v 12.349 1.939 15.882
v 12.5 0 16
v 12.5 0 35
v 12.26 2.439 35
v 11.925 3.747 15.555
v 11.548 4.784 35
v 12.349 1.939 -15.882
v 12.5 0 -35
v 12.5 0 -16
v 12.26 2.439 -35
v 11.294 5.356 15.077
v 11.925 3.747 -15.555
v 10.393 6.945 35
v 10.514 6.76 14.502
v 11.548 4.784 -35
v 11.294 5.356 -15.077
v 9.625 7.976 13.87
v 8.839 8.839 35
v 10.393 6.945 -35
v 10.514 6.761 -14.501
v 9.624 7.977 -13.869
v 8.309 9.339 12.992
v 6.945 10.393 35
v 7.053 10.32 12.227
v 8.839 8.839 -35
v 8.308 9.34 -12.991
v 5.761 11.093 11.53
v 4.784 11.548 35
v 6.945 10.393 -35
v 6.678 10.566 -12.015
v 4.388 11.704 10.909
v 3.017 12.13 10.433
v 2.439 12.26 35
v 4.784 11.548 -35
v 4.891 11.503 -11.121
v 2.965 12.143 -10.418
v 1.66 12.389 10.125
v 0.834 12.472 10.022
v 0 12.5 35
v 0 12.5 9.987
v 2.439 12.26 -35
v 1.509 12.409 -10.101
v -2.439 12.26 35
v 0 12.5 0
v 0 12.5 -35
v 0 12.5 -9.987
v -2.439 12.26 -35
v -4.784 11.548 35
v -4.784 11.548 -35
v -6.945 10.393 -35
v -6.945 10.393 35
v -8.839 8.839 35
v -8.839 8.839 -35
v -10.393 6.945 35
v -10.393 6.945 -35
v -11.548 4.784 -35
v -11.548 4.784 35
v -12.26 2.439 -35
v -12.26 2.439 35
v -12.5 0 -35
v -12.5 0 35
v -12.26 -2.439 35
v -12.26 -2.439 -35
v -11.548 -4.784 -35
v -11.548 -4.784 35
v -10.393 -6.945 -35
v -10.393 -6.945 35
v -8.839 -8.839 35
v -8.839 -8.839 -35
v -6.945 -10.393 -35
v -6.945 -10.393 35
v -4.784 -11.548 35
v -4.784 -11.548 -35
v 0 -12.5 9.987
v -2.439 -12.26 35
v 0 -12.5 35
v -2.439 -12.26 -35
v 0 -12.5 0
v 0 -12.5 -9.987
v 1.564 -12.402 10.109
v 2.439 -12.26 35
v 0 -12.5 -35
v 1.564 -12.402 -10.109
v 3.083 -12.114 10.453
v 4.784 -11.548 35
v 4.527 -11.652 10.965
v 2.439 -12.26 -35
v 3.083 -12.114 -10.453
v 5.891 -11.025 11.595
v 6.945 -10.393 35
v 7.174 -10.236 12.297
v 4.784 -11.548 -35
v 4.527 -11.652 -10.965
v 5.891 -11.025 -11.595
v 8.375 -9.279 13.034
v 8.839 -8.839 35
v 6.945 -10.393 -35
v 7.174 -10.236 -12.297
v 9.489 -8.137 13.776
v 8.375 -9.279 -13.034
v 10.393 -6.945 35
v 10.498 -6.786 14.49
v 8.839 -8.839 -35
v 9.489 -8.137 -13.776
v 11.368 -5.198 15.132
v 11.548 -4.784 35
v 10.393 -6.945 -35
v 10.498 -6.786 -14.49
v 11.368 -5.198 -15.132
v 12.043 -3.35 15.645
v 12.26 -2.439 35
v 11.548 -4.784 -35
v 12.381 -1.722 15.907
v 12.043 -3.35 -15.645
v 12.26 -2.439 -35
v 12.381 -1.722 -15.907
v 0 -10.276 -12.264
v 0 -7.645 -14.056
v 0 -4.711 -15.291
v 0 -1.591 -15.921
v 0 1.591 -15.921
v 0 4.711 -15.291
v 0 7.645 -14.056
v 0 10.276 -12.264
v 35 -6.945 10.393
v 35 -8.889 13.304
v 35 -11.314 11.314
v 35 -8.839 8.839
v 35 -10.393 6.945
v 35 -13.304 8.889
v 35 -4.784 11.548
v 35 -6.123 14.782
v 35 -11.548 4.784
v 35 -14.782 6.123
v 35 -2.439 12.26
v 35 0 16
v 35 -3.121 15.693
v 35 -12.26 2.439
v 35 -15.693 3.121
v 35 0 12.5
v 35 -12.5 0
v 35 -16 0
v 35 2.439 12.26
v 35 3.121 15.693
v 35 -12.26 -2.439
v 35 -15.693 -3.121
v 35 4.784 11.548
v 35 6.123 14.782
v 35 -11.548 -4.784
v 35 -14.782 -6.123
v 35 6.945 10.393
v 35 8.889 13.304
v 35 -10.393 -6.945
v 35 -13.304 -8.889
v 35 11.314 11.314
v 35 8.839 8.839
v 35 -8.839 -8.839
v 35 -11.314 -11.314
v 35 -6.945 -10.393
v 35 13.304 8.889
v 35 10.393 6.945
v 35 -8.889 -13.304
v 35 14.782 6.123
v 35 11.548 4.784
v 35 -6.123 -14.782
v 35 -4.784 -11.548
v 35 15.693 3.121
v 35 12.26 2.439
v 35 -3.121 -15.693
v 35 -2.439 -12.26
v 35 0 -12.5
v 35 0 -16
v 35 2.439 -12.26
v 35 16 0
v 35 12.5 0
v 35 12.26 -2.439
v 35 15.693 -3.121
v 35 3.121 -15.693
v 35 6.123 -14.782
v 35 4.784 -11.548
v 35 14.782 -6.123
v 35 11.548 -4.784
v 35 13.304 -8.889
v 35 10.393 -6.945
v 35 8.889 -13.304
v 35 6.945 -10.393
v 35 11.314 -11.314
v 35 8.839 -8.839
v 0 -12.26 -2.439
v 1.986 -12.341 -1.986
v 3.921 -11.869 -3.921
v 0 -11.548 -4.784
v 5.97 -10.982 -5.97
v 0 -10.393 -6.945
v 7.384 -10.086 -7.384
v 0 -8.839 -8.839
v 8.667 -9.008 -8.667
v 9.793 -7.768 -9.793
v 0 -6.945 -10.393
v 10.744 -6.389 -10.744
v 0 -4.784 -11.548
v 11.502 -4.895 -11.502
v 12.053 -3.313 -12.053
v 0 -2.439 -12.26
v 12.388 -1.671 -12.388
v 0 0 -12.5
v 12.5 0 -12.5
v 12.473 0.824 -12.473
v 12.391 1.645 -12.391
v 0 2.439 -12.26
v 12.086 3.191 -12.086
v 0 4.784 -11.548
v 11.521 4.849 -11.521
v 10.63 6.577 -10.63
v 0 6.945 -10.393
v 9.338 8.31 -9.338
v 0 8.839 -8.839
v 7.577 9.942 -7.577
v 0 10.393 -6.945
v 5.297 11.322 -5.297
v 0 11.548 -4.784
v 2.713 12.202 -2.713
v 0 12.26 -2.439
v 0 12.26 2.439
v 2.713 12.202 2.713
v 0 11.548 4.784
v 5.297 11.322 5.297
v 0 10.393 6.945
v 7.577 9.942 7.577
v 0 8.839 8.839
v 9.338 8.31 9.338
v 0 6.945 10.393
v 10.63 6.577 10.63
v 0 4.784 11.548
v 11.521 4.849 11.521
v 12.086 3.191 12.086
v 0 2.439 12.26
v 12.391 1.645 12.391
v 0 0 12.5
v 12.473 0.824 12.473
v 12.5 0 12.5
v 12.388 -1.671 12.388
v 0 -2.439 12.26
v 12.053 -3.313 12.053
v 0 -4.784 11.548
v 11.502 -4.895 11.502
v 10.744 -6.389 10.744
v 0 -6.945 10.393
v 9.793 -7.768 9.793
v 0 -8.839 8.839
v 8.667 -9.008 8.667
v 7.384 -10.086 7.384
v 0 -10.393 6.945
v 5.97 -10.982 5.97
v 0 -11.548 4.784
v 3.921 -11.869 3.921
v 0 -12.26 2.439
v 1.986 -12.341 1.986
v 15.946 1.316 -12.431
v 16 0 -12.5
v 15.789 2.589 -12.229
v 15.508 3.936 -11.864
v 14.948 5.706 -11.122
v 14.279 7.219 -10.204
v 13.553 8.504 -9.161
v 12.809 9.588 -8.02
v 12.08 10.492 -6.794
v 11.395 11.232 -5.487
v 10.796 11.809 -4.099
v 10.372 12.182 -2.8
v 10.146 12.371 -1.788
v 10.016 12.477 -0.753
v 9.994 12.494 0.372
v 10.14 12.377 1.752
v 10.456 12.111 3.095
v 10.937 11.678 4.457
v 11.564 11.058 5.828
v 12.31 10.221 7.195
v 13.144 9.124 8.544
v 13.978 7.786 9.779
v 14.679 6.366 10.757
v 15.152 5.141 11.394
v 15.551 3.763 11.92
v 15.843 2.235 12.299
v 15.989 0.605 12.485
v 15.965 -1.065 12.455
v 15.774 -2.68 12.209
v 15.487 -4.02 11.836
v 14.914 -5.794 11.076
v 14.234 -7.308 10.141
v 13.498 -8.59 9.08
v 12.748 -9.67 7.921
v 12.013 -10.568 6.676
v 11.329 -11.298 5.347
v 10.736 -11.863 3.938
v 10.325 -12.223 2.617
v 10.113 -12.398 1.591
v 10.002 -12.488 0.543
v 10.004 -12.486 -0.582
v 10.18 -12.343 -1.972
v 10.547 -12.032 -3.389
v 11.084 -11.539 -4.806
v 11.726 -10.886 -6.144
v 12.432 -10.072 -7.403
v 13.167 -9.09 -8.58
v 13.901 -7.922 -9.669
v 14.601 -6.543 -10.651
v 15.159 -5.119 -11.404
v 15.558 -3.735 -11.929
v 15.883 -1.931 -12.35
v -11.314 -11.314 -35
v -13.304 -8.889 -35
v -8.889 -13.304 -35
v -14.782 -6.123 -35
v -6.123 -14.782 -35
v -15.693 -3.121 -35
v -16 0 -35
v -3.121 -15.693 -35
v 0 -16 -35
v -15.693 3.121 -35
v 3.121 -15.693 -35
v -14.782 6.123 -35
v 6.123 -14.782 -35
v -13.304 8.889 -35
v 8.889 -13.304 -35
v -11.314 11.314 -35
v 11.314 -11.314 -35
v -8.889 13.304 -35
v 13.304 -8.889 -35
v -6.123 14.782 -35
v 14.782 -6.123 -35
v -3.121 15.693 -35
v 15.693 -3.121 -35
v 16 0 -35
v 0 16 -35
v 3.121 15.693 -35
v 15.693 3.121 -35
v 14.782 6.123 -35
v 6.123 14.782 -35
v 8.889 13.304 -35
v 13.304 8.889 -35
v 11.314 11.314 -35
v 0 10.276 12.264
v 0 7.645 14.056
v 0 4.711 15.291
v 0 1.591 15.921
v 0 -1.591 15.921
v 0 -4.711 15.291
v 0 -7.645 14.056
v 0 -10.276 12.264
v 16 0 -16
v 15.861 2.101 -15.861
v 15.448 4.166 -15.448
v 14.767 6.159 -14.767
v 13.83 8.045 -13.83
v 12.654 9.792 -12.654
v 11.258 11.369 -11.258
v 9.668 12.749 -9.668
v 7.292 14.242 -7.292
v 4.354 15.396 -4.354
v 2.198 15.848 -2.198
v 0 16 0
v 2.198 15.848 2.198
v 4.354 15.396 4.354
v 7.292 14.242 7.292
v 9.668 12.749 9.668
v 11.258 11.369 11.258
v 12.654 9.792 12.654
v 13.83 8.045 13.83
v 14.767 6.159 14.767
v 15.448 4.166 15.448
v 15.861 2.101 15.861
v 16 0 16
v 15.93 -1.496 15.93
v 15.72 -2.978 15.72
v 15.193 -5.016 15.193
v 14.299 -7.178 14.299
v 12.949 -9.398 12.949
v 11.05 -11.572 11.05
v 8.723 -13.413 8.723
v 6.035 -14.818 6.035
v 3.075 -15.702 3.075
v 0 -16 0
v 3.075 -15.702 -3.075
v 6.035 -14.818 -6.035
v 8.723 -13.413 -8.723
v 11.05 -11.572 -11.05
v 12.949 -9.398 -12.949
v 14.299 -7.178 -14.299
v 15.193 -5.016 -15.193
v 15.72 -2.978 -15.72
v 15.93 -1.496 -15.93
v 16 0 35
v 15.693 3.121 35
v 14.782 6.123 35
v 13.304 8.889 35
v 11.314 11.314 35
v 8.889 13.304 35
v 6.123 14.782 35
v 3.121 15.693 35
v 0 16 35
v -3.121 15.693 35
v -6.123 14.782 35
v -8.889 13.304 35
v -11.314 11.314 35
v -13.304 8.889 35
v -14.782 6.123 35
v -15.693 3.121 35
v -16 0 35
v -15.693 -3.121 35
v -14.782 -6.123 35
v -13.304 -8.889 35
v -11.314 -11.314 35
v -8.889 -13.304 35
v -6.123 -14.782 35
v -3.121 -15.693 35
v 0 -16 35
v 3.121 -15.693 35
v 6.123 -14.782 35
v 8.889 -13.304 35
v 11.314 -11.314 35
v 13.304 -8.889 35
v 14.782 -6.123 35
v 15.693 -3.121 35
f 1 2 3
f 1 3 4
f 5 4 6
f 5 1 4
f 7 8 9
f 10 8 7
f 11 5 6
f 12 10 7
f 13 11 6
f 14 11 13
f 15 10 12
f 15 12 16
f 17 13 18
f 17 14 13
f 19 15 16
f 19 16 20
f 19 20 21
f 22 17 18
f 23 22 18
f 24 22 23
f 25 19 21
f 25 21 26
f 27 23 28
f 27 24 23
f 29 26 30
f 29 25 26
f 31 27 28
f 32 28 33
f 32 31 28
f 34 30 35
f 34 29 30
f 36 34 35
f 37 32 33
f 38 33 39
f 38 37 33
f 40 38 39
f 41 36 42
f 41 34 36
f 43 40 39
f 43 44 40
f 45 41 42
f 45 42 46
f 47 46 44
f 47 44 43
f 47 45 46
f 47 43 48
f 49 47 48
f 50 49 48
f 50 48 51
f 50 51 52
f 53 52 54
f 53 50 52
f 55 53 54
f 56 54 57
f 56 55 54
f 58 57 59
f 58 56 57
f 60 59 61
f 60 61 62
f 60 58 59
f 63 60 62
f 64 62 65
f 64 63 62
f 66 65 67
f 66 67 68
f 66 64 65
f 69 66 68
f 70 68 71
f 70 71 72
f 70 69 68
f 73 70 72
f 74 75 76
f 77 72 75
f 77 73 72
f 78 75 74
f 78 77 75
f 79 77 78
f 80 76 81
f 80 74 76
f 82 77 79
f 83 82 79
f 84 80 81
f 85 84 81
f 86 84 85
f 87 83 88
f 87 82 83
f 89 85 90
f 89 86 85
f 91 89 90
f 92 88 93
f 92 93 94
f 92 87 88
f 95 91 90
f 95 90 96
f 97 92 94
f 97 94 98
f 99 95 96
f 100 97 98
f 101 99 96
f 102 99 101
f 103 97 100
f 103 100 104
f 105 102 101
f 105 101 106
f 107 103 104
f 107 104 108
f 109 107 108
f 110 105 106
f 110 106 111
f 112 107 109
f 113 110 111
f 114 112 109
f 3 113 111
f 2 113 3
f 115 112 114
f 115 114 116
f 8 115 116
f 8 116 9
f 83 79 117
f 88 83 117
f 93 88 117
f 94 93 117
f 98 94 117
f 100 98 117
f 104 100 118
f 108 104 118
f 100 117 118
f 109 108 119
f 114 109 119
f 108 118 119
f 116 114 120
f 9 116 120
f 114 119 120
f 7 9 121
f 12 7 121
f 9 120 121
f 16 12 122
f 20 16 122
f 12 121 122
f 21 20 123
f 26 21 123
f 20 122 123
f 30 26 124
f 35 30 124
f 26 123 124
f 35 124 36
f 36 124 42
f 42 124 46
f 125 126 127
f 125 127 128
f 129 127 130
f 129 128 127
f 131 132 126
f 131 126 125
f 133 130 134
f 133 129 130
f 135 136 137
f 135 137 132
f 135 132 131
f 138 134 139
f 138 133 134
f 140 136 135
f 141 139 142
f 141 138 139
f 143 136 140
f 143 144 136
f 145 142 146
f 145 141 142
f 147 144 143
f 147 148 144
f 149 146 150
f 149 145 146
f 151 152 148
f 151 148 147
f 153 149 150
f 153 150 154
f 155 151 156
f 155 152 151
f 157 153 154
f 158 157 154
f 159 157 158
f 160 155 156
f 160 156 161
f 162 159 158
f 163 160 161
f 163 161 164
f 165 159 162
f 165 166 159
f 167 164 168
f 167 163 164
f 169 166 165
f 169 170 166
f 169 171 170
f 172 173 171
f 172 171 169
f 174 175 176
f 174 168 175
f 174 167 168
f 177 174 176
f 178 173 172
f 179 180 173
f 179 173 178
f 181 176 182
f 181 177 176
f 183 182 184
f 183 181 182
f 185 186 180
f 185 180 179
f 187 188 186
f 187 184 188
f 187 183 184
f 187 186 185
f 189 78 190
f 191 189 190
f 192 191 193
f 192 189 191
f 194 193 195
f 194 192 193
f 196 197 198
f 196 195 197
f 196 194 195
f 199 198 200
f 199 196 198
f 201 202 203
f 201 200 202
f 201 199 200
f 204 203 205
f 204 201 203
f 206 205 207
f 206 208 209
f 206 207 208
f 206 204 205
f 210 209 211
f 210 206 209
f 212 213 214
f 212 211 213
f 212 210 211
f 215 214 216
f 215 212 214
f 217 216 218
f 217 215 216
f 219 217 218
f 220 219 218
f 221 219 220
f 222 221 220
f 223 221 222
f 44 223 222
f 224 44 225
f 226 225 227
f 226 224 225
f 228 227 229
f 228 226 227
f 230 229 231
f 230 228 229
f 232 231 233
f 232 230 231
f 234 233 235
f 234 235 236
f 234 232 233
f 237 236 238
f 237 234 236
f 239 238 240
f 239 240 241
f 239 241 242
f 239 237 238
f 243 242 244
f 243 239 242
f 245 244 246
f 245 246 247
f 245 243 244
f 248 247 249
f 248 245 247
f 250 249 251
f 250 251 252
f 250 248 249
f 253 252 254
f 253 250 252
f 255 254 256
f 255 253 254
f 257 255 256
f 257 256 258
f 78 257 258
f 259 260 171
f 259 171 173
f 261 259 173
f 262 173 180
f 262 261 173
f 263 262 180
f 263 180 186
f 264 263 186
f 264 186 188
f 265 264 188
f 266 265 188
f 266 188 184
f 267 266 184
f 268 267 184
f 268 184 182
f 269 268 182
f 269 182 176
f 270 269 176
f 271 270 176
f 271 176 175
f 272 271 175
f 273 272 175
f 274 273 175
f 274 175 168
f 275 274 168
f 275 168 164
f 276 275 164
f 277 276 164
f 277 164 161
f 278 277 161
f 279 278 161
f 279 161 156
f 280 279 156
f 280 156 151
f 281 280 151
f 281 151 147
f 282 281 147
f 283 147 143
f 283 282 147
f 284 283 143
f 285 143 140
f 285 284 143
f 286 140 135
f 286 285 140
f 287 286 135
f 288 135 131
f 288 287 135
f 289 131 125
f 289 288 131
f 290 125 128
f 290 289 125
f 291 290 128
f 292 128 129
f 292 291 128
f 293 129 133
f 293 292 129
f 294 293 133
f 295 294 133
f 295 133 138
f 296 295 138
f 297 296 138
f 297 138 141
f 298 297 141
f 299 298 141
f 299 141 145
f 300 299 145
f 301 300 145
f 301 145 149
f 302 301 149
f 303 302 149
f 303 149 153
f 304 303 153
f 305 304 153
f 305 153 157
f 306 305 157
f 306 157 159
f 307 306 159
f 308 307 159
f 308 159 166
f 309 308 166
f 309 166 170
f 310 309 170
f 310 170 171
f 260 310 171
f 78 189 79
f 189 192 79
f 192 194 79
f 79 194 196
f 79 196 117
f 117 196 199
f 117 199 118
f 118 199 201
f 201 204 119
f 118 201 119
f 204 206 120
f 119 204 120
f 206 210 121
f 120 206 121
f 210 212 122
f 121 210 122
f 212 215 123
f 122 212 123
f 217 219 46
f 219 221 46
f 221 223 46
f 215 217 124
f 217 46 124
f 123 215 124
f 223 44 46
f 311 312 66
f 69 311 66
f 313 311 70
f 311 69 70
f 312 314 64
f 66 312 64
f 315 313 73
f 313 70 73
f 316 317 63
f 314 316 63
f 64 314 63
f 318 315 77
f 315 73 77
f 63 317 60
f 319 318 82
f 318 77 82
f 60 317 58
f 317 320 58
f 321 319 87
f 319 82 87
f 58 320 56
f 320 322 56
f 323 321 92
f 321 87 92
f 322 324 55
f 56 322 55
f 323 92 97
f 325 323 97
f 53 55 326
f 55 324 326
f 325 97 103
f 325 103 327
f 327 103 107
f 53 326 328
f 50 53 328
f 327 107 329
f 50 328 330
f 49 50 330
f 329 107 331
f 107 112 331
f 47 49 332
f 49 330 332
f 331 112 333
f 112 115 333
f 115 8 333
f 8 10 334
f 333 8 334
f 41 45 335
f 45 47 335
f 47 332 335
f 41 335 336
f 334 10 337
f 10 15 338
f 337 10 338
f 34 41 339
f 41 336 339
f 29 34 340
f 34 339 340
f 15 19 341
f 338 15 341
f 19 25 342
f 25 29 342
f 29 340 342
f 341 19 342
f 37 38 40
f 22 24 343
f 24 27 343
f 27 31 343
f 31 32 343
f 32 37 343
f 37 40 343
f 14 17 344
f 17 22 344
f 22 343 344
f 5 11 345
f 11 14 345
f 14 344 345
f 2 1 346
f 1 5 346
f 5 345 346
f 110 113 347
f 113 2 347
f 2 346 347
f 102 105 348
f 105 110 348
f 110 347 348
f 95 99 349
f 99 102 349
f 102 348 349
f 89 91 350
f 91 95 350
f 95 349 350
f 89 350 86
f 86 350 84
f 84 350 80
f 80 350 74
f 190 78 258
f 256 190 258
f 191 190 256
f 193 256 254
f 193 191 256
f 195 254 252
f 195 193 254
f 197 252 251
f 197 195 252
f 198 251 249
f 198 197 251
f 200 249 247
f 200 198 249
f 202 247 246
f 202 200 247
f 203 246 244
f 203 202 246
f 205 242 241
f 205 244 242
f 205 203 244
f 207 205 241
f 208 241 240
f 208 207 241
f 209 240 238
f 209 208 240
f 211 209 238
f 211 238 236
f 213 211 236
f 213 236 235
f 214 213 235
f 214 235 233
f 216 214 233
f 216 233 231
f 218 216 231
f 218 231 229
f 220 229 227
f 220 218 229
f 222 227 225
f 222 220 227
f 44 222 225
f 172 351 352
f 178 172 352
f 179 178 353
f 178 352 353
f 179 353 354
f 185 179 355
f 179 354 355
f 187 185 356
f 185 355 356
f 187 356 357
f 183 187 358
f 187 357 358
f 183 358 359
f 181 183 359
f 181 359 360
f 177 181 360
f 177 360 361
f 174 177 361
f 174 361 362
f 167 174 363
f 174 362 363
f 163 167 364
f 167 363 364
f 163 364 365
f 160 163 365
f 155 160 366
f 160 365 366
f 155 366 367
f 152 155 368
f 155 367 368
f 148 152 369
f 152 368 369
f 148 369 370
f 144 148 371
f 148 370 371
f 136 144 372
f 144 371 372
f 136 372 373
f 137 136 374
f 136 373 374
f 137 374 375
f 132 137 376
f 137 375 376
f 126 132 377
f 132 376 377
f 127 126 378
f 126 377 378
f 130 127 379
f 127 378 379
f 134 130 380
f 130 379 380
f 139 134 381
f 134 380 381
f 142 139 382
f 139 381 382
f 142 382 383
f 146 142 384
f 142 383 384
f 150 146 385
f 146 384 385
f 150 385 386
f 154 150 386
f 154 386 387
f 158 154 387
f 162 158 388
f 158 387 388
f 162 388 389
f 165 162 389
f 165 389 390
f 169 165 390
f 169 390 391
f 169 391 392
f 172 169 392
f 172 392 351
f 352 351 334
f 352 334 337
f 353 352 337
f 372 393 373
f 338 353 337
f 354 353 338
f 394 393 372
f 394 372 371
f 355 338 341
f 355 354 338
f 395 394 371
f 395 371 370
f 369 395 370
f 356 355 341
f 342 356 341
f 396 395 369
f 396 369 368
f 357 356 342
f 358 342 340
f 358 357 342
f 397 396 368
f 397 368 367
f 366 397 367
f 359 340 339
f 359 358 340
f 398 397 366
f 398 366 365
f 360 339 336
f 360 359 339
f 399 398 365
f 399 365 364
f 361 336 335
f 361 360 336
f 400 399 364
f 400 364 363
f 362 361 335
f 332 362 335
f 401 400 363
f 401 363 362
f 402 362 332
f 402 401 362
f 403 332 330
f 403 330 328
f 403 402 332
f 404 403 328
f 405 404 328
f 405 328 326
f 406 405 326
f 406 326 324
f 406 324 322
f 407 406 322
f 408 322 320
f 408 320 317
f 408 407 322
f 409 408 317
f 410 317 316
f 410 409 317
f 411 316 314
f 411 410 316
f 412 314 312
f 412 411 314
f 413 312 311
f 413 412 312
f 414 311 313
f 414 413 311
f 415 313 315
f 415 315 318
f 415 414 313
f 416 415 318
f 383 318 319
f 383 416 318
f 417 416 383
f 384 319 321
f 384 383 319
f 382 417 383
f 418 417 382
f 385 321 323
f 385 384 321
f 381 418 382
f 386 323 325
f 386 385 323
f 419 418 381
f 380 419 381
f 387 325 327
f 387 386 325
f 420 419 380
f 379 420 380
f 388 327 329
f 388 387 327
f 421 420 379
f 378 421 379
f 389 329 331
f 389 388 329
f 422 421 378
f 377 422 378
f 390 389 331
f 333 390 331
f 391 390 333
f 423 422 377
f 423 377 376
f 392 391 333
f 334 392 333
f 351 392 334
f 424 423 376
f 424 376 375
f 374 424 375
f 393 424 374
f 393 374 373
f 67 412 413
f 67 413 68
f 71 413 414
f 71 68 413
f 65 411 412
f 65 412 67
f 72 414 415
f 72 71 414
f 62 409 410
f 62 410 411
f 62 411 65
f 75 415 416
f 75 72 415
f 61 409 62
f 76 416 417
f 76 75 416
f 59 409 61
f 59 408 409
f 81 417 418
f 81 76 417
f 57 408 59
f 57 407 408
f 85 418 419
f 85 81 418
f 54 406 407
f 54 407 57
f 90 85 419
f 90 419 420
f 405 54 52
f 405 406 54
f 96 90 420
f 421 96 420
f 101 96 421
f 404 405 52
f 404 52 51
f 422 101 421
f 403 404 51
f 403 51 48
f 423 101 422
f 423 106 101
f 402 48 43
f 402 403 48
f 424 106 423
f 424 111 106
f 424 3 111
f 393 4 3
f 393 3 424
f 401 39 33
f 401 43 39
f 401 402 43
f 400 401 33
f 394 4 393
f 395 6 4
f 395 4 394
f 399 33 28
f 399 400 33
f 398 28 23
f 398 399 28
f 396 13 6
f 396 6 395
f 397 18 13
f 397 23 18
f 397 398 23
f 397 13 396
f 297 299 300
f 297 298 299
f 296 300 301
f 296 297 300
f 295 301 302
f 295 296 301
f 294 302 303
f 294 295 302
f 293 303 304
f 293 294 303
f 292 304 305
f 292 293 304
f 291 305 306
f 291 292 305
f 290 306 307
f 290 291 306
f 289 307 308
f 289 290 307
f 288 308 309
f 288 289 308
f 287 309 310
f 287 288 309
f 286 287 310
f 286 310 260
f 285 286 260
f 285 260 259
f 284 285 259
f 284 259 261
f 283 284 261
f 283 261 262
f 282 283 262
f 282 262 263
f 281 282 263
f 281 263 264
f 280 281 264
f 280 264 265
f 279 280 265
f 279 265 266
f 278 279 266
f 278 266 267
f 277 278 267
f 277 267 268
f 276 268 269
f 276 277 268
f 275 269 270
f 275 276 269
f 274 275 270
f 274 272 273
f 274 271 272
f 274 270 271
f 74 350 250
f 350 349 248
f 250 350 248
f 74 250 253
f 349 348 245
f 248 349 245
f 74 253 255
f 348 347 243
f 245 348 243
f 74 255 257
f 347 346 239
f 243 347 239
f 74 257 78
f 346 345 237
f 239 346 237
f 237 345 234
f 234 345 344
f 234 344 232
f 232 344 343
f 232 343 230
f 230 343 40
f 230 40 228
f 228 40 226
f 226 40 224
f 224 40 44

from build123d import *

# Parameters (mm, degrees)
SKETCH_1_R      = 16
SKETCH_1_R_2    = 12.5
EXTRUDE_1_DEPTH = 35
SKETCH_2_R      = 16
SKETCH_2_R_2    = 12.5
EXTRUDE_2_DEPTH = 35


with BuildPart() as part:
    # 草图1 → 凸台-拉伸1 (new body, symmetric)
    with BuildSketch(Plane.XY):
        Circle(SKETCH_1_R)
        Circle(SKETCH_1_R_2, mode=Mode.SUBTRACT)
    extrude(amount=EXTRUDE_1_DEPTH, both=True)

    # 草图2 → 凸台-拉伸2 (add)
    with BuildSketch(Plane(origin=(0, 0, 0), x_dir=(0, 0, -1), z_dir=(1, 0, 0))):
        Circle(SKETCH_2_R)
        Circle(SKETCH_2_R_2, mode=Mode.SUBTRACT)
    extrude(amount=EXTRUDE_2_DEPTH)


solid = part.part
